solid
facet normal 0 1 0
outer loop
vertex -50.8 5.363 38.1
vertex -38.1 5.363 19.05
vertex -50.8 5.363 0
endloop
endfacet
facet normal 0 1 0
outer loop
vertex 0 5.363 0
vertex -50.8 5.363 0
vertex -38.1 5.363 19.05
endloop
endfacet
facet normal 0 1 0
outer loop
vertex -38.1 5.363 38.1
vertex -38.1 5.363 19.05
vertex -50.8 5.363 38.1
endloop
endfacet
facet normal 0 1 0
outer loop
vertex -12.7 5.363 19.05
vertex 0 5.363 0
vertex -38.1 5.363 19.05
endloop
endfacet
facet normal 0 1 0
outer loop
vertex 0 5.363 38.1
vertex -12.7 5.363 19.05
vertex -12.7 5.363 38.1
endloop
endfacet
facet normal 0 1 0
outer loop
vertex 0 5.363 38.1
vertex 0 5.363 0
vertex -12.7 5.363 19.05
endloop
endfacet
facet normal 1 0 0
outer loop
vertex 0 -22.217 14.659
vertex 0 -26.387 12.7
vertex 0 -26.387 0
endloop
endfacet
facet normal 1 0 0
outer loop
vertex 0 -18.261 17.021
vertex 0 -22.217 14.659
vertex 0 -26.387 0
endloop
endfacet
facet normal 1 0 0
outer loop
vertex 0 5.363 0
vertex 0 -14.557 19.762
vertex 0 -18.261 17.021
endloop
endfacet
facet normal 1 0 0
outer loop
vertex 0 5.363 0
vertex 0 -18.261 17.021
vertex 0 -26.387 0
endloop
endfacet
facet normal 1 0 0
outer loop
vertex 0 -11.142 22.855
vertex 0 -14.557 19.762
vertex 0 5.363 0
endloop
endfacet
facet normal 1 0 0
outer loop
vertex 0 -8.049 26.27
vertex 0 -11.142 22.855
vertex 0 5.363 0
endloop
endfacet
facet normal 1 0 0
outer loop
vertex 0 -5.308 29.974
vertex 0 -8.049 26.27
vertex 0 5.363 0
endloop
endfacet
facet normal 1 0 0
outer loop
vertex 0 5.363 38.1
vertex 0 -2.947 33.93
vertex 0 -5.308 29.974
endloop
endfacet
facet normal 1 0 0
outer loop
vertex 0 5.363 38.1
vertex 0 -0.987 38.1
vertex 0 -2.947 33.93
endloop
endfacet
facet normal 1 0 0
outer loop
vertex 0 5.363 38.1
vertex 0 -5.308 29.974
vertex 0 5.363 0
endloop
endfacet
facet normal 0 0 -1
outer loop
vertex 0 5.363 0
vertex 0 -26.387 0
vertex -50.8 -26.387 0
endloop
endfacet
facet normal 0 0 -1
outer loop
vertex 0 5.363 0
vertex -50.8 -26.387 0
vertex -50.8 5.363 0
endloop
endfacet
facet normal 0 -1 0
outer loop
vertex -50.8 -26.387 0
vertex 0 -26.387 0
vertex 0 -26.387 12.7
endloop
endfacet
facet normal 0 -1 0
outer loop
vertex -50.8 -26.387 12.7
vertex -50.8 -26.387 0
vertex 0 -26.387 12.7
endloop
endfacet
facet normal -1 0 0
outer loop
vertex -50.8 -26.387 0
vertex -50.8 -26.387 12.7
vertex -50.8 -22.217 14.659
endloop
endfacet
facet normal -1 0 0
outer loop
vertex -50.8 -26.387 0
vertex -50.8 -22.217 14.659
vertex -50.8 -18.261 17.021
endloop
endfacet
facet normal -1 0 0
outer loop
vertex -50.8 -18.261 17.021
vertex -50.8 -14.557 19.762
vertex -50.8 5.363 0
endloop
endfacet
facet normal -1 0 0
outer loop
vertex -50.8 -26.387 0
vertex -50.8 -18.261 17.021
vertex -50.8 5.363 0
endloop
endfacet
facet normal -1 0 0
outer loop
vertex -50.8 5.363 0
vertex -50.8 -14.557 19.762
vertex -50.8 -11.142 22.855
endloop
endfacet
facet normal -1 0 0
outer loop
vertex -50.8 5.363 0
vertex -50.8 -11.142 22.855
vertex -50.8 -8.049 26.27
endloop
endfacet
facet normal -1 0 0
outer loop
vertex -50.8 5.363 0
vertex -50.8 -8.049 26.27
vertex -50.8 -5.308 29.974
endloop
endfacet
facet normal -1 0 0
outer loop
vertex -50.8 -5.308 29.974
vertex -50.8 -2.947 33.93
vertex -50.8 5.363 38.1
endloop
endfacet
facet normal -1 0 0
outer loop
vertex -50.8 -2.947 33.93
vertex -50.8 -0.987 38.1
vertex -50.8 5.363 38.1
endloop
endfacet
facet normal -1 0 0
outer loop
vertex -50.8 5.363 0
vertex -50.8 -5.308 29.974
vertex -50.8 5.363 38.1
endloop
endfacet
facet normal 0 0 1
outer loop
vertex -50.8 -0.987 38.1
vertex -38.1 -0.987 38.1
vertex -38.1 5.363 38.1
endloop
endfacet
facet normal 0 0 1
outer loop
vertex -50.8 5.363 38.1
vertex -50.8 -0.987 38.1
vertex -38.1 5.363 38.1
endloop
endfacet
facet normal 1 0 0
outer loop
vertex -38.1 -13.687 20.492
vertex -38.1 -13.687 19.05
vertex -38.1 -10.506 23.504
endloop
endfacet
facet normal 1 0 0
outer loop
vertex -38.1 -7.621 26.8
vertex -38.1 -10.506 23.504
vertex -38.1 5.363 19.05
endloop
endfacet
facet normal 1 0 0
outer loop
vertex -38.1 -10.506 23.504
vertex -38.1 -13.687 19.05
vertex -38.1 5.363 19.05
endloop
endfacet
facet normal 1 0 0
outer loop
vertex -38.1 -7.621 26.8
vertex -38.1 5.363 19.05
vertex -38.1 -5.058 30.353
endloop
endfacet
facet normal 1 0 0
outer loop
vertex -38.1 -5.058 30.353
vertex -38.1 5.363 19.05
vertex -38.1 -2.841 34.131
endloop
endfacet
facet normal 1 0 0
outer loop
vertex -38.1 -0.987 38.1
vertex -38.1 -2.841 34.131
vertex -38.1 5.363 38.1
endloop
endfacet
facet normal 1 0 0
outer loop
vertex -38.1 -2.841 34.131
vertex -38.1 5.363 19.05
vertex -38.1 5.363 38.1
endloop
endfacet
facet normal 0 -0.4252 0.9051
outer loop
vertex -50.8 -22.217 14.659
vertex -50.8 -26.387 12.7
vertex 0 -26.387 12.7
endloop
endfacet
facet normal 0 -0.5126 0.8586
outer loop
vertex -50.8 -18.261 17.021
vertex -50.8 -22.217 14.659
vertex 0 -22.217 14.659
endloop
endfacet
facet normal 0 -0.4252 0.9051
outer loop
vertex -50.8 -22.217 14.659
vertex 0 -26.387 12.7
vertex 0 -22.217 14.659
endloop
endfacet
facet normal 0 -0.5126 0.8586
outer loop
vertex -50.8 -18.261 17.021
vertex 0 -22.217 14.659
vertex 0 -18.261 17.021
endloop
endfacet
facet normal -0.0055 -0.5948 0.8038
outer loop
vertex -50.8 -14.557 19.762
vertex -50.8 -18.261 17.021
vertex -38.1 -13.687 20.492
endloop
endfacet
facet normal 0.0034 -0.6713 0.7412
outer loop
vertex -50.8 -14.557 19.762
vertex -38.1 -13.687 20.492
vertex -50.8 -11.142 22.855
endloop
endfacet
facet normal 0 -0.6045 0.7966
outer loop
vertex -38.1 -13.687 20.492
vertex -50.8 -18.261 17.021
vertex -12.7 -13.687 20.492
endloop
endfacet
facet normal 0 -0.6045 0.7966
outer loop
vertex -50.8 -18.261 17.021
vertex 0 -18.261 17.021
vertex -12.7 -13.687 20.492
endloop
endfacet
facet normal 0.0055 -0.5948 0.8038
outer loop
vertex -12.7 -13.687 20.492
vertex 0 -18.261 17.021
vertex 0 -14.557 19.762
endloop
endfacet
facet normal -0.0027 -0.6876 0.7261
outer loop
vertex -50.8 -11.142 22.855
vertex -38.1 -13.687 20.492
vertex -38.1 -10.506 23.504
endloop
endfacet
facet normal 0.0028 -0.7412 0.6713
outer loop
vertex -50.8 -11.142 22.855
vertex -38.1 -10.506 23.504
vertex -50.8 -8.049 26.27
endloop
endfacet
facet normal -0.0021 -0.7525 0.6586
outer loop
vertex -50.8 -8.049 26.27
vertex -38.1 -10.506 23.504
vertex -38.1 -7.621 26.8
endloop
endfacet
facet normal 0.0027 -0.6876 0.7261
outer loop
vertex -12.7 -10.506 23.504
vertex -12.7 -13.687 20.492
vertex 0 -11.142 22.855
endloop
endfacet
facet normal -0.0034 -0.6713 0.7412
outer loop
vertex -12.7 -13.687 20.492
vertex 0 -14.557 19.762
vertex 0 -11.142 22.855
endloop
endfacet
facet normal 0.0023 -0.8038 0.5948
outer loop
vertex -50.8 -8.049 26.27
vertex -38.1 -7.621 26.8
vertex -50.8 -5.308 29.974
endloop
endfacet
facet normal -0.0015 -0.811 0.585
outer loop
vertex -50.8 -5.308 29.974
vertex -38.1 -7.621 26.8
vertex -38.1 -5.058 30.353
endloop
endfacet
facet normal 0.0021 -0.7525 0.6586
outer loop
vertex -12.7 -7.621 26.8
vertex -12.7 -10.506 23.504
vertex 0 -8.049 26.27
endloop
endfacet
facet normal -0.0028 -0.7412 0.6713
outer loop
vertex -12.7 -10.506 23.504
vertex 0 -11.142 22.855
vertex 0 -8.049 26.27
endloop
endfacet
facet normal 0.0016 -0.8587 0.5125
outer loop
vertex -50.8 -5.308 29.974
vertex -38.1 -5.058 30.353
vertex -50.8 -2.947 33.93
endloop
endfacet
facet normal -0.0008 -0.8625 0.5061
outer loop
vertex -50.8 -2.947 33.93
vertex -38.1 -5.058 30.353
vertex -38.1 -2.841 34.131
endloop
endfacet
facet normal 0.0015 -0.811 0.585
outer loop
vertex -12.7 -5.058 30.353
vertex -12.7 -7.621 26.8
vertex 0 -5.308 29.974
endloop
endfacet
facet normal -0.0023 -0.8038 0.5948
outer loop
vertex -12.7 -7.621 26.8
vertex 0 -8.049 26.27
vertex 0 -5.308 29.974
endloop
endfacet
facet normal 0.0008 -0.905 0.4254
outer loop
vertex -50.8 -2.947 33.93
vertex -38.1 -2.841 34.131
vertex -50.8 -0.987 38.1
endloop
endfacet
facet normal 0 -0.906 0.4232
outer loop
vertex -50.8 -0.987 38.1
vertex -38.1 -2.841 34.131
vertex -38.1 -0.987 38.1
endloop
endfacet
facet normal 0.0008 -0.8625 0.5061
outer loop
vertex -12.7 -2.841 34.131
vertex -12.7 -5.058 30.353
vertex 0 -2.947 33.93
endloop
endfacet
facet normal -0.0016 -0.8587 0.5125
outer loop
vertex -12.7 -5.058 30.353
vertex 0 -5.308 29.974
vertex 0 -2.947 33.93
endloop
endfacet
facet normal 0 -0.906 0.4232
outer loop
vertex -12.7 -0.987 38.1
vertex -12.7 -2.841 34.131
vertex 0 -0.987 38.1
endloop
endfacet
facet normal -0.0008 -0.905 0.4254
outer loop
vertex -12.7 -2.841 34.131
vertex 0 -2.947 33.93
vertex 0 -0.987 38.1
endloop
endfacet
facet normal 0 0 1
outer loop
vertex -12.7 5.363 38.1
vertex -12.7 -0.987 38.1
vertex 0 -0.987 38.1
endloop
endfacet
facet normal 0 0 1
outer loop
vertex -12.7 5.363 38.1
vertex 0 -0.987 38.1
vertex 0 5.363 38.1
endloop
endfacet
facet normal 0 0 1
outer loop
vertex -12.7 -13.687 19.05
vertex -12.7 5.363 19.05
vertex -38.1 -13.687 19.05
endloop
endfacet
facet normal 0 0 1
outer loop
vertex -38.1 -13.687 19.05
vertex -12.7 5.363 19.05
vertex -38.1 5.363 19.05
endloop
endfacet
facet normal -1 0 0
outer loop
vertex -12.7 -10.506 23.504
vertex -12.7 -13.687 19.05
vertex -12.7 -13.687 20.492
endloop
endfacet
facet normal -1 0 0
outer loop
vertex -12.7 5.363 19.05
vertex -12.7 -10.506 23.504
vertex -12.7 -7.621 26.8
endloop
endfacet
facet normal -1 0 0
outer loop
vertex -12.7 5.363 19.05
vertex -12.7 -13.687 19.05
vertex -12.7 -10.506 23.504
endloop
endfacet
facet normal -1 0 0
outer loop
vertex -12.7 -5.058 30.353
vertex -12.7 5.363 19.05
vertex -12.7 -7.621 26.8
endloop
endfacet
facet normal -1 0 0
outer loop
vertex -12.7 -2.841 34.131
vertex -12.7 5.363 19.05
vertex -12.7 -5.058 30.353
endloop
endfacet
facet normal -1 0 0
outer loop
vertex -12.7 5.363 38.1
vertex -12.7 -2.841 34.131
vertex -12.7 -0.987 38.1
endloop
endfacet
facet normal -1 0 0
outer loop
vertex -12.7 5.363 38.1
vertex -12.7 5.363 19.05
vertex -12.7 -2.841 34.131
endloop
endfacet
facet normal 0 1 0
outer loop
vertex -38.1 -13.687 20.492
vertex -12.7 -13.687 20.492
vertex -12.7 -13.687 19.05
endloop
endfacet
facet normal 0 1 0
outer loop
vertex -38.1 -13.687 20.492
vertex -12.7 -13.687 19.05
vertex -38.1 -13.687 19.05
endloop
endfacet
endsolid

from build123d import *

# Parameters (mm, degrees)
F0_W     = 31.75
F0_H     = 38.1
F1_DEPTH = 50.8
F3_DEPTH = 50.8
F4_W     = 25.4
F4_H     = 19.05
F5_DEPTH = 19.05


with BuildPart() as f1:
    # F0 (on Right) → F1 (new body)
    with BuildSketch(Plane.YZ):
        with Locations((-10.51228, 19.05)):
            Rectangle(F0_W, F0_H)
    extrude(amount=-F1_DEPTH)

    # F2 (on face) → F3 (cut)
    with BuildSketch(Plane.YZ):
        with BuildLine():
            Line((-26.38728, 38.1), (-26.38728, 12.7))
            ThreePointArc((-26.38728, 12.7), (-11.141967, 22.854688), (-0.98728, 38.1))
            Line((-0.98728, 38.1), (-26.38728, 38.1))
        make_face()
    extrude(amount=-F3_DEPTH, mode=Mode.SUBTRACT)

    # F4 (on face) → F5 (cut)
    with BuildSketch(Plane(origin=(0, 5.36272, 0), x_dir=(-1, 0, 0), z_dir=(0, 1, 0))):
        with Locations((25.4, 28.575)):
            Rectangle(F4_W, F4_H)
    extrude(amount=-F5_DEPTH, mode=Mode.SUBTRACT)


solid = f1.part
